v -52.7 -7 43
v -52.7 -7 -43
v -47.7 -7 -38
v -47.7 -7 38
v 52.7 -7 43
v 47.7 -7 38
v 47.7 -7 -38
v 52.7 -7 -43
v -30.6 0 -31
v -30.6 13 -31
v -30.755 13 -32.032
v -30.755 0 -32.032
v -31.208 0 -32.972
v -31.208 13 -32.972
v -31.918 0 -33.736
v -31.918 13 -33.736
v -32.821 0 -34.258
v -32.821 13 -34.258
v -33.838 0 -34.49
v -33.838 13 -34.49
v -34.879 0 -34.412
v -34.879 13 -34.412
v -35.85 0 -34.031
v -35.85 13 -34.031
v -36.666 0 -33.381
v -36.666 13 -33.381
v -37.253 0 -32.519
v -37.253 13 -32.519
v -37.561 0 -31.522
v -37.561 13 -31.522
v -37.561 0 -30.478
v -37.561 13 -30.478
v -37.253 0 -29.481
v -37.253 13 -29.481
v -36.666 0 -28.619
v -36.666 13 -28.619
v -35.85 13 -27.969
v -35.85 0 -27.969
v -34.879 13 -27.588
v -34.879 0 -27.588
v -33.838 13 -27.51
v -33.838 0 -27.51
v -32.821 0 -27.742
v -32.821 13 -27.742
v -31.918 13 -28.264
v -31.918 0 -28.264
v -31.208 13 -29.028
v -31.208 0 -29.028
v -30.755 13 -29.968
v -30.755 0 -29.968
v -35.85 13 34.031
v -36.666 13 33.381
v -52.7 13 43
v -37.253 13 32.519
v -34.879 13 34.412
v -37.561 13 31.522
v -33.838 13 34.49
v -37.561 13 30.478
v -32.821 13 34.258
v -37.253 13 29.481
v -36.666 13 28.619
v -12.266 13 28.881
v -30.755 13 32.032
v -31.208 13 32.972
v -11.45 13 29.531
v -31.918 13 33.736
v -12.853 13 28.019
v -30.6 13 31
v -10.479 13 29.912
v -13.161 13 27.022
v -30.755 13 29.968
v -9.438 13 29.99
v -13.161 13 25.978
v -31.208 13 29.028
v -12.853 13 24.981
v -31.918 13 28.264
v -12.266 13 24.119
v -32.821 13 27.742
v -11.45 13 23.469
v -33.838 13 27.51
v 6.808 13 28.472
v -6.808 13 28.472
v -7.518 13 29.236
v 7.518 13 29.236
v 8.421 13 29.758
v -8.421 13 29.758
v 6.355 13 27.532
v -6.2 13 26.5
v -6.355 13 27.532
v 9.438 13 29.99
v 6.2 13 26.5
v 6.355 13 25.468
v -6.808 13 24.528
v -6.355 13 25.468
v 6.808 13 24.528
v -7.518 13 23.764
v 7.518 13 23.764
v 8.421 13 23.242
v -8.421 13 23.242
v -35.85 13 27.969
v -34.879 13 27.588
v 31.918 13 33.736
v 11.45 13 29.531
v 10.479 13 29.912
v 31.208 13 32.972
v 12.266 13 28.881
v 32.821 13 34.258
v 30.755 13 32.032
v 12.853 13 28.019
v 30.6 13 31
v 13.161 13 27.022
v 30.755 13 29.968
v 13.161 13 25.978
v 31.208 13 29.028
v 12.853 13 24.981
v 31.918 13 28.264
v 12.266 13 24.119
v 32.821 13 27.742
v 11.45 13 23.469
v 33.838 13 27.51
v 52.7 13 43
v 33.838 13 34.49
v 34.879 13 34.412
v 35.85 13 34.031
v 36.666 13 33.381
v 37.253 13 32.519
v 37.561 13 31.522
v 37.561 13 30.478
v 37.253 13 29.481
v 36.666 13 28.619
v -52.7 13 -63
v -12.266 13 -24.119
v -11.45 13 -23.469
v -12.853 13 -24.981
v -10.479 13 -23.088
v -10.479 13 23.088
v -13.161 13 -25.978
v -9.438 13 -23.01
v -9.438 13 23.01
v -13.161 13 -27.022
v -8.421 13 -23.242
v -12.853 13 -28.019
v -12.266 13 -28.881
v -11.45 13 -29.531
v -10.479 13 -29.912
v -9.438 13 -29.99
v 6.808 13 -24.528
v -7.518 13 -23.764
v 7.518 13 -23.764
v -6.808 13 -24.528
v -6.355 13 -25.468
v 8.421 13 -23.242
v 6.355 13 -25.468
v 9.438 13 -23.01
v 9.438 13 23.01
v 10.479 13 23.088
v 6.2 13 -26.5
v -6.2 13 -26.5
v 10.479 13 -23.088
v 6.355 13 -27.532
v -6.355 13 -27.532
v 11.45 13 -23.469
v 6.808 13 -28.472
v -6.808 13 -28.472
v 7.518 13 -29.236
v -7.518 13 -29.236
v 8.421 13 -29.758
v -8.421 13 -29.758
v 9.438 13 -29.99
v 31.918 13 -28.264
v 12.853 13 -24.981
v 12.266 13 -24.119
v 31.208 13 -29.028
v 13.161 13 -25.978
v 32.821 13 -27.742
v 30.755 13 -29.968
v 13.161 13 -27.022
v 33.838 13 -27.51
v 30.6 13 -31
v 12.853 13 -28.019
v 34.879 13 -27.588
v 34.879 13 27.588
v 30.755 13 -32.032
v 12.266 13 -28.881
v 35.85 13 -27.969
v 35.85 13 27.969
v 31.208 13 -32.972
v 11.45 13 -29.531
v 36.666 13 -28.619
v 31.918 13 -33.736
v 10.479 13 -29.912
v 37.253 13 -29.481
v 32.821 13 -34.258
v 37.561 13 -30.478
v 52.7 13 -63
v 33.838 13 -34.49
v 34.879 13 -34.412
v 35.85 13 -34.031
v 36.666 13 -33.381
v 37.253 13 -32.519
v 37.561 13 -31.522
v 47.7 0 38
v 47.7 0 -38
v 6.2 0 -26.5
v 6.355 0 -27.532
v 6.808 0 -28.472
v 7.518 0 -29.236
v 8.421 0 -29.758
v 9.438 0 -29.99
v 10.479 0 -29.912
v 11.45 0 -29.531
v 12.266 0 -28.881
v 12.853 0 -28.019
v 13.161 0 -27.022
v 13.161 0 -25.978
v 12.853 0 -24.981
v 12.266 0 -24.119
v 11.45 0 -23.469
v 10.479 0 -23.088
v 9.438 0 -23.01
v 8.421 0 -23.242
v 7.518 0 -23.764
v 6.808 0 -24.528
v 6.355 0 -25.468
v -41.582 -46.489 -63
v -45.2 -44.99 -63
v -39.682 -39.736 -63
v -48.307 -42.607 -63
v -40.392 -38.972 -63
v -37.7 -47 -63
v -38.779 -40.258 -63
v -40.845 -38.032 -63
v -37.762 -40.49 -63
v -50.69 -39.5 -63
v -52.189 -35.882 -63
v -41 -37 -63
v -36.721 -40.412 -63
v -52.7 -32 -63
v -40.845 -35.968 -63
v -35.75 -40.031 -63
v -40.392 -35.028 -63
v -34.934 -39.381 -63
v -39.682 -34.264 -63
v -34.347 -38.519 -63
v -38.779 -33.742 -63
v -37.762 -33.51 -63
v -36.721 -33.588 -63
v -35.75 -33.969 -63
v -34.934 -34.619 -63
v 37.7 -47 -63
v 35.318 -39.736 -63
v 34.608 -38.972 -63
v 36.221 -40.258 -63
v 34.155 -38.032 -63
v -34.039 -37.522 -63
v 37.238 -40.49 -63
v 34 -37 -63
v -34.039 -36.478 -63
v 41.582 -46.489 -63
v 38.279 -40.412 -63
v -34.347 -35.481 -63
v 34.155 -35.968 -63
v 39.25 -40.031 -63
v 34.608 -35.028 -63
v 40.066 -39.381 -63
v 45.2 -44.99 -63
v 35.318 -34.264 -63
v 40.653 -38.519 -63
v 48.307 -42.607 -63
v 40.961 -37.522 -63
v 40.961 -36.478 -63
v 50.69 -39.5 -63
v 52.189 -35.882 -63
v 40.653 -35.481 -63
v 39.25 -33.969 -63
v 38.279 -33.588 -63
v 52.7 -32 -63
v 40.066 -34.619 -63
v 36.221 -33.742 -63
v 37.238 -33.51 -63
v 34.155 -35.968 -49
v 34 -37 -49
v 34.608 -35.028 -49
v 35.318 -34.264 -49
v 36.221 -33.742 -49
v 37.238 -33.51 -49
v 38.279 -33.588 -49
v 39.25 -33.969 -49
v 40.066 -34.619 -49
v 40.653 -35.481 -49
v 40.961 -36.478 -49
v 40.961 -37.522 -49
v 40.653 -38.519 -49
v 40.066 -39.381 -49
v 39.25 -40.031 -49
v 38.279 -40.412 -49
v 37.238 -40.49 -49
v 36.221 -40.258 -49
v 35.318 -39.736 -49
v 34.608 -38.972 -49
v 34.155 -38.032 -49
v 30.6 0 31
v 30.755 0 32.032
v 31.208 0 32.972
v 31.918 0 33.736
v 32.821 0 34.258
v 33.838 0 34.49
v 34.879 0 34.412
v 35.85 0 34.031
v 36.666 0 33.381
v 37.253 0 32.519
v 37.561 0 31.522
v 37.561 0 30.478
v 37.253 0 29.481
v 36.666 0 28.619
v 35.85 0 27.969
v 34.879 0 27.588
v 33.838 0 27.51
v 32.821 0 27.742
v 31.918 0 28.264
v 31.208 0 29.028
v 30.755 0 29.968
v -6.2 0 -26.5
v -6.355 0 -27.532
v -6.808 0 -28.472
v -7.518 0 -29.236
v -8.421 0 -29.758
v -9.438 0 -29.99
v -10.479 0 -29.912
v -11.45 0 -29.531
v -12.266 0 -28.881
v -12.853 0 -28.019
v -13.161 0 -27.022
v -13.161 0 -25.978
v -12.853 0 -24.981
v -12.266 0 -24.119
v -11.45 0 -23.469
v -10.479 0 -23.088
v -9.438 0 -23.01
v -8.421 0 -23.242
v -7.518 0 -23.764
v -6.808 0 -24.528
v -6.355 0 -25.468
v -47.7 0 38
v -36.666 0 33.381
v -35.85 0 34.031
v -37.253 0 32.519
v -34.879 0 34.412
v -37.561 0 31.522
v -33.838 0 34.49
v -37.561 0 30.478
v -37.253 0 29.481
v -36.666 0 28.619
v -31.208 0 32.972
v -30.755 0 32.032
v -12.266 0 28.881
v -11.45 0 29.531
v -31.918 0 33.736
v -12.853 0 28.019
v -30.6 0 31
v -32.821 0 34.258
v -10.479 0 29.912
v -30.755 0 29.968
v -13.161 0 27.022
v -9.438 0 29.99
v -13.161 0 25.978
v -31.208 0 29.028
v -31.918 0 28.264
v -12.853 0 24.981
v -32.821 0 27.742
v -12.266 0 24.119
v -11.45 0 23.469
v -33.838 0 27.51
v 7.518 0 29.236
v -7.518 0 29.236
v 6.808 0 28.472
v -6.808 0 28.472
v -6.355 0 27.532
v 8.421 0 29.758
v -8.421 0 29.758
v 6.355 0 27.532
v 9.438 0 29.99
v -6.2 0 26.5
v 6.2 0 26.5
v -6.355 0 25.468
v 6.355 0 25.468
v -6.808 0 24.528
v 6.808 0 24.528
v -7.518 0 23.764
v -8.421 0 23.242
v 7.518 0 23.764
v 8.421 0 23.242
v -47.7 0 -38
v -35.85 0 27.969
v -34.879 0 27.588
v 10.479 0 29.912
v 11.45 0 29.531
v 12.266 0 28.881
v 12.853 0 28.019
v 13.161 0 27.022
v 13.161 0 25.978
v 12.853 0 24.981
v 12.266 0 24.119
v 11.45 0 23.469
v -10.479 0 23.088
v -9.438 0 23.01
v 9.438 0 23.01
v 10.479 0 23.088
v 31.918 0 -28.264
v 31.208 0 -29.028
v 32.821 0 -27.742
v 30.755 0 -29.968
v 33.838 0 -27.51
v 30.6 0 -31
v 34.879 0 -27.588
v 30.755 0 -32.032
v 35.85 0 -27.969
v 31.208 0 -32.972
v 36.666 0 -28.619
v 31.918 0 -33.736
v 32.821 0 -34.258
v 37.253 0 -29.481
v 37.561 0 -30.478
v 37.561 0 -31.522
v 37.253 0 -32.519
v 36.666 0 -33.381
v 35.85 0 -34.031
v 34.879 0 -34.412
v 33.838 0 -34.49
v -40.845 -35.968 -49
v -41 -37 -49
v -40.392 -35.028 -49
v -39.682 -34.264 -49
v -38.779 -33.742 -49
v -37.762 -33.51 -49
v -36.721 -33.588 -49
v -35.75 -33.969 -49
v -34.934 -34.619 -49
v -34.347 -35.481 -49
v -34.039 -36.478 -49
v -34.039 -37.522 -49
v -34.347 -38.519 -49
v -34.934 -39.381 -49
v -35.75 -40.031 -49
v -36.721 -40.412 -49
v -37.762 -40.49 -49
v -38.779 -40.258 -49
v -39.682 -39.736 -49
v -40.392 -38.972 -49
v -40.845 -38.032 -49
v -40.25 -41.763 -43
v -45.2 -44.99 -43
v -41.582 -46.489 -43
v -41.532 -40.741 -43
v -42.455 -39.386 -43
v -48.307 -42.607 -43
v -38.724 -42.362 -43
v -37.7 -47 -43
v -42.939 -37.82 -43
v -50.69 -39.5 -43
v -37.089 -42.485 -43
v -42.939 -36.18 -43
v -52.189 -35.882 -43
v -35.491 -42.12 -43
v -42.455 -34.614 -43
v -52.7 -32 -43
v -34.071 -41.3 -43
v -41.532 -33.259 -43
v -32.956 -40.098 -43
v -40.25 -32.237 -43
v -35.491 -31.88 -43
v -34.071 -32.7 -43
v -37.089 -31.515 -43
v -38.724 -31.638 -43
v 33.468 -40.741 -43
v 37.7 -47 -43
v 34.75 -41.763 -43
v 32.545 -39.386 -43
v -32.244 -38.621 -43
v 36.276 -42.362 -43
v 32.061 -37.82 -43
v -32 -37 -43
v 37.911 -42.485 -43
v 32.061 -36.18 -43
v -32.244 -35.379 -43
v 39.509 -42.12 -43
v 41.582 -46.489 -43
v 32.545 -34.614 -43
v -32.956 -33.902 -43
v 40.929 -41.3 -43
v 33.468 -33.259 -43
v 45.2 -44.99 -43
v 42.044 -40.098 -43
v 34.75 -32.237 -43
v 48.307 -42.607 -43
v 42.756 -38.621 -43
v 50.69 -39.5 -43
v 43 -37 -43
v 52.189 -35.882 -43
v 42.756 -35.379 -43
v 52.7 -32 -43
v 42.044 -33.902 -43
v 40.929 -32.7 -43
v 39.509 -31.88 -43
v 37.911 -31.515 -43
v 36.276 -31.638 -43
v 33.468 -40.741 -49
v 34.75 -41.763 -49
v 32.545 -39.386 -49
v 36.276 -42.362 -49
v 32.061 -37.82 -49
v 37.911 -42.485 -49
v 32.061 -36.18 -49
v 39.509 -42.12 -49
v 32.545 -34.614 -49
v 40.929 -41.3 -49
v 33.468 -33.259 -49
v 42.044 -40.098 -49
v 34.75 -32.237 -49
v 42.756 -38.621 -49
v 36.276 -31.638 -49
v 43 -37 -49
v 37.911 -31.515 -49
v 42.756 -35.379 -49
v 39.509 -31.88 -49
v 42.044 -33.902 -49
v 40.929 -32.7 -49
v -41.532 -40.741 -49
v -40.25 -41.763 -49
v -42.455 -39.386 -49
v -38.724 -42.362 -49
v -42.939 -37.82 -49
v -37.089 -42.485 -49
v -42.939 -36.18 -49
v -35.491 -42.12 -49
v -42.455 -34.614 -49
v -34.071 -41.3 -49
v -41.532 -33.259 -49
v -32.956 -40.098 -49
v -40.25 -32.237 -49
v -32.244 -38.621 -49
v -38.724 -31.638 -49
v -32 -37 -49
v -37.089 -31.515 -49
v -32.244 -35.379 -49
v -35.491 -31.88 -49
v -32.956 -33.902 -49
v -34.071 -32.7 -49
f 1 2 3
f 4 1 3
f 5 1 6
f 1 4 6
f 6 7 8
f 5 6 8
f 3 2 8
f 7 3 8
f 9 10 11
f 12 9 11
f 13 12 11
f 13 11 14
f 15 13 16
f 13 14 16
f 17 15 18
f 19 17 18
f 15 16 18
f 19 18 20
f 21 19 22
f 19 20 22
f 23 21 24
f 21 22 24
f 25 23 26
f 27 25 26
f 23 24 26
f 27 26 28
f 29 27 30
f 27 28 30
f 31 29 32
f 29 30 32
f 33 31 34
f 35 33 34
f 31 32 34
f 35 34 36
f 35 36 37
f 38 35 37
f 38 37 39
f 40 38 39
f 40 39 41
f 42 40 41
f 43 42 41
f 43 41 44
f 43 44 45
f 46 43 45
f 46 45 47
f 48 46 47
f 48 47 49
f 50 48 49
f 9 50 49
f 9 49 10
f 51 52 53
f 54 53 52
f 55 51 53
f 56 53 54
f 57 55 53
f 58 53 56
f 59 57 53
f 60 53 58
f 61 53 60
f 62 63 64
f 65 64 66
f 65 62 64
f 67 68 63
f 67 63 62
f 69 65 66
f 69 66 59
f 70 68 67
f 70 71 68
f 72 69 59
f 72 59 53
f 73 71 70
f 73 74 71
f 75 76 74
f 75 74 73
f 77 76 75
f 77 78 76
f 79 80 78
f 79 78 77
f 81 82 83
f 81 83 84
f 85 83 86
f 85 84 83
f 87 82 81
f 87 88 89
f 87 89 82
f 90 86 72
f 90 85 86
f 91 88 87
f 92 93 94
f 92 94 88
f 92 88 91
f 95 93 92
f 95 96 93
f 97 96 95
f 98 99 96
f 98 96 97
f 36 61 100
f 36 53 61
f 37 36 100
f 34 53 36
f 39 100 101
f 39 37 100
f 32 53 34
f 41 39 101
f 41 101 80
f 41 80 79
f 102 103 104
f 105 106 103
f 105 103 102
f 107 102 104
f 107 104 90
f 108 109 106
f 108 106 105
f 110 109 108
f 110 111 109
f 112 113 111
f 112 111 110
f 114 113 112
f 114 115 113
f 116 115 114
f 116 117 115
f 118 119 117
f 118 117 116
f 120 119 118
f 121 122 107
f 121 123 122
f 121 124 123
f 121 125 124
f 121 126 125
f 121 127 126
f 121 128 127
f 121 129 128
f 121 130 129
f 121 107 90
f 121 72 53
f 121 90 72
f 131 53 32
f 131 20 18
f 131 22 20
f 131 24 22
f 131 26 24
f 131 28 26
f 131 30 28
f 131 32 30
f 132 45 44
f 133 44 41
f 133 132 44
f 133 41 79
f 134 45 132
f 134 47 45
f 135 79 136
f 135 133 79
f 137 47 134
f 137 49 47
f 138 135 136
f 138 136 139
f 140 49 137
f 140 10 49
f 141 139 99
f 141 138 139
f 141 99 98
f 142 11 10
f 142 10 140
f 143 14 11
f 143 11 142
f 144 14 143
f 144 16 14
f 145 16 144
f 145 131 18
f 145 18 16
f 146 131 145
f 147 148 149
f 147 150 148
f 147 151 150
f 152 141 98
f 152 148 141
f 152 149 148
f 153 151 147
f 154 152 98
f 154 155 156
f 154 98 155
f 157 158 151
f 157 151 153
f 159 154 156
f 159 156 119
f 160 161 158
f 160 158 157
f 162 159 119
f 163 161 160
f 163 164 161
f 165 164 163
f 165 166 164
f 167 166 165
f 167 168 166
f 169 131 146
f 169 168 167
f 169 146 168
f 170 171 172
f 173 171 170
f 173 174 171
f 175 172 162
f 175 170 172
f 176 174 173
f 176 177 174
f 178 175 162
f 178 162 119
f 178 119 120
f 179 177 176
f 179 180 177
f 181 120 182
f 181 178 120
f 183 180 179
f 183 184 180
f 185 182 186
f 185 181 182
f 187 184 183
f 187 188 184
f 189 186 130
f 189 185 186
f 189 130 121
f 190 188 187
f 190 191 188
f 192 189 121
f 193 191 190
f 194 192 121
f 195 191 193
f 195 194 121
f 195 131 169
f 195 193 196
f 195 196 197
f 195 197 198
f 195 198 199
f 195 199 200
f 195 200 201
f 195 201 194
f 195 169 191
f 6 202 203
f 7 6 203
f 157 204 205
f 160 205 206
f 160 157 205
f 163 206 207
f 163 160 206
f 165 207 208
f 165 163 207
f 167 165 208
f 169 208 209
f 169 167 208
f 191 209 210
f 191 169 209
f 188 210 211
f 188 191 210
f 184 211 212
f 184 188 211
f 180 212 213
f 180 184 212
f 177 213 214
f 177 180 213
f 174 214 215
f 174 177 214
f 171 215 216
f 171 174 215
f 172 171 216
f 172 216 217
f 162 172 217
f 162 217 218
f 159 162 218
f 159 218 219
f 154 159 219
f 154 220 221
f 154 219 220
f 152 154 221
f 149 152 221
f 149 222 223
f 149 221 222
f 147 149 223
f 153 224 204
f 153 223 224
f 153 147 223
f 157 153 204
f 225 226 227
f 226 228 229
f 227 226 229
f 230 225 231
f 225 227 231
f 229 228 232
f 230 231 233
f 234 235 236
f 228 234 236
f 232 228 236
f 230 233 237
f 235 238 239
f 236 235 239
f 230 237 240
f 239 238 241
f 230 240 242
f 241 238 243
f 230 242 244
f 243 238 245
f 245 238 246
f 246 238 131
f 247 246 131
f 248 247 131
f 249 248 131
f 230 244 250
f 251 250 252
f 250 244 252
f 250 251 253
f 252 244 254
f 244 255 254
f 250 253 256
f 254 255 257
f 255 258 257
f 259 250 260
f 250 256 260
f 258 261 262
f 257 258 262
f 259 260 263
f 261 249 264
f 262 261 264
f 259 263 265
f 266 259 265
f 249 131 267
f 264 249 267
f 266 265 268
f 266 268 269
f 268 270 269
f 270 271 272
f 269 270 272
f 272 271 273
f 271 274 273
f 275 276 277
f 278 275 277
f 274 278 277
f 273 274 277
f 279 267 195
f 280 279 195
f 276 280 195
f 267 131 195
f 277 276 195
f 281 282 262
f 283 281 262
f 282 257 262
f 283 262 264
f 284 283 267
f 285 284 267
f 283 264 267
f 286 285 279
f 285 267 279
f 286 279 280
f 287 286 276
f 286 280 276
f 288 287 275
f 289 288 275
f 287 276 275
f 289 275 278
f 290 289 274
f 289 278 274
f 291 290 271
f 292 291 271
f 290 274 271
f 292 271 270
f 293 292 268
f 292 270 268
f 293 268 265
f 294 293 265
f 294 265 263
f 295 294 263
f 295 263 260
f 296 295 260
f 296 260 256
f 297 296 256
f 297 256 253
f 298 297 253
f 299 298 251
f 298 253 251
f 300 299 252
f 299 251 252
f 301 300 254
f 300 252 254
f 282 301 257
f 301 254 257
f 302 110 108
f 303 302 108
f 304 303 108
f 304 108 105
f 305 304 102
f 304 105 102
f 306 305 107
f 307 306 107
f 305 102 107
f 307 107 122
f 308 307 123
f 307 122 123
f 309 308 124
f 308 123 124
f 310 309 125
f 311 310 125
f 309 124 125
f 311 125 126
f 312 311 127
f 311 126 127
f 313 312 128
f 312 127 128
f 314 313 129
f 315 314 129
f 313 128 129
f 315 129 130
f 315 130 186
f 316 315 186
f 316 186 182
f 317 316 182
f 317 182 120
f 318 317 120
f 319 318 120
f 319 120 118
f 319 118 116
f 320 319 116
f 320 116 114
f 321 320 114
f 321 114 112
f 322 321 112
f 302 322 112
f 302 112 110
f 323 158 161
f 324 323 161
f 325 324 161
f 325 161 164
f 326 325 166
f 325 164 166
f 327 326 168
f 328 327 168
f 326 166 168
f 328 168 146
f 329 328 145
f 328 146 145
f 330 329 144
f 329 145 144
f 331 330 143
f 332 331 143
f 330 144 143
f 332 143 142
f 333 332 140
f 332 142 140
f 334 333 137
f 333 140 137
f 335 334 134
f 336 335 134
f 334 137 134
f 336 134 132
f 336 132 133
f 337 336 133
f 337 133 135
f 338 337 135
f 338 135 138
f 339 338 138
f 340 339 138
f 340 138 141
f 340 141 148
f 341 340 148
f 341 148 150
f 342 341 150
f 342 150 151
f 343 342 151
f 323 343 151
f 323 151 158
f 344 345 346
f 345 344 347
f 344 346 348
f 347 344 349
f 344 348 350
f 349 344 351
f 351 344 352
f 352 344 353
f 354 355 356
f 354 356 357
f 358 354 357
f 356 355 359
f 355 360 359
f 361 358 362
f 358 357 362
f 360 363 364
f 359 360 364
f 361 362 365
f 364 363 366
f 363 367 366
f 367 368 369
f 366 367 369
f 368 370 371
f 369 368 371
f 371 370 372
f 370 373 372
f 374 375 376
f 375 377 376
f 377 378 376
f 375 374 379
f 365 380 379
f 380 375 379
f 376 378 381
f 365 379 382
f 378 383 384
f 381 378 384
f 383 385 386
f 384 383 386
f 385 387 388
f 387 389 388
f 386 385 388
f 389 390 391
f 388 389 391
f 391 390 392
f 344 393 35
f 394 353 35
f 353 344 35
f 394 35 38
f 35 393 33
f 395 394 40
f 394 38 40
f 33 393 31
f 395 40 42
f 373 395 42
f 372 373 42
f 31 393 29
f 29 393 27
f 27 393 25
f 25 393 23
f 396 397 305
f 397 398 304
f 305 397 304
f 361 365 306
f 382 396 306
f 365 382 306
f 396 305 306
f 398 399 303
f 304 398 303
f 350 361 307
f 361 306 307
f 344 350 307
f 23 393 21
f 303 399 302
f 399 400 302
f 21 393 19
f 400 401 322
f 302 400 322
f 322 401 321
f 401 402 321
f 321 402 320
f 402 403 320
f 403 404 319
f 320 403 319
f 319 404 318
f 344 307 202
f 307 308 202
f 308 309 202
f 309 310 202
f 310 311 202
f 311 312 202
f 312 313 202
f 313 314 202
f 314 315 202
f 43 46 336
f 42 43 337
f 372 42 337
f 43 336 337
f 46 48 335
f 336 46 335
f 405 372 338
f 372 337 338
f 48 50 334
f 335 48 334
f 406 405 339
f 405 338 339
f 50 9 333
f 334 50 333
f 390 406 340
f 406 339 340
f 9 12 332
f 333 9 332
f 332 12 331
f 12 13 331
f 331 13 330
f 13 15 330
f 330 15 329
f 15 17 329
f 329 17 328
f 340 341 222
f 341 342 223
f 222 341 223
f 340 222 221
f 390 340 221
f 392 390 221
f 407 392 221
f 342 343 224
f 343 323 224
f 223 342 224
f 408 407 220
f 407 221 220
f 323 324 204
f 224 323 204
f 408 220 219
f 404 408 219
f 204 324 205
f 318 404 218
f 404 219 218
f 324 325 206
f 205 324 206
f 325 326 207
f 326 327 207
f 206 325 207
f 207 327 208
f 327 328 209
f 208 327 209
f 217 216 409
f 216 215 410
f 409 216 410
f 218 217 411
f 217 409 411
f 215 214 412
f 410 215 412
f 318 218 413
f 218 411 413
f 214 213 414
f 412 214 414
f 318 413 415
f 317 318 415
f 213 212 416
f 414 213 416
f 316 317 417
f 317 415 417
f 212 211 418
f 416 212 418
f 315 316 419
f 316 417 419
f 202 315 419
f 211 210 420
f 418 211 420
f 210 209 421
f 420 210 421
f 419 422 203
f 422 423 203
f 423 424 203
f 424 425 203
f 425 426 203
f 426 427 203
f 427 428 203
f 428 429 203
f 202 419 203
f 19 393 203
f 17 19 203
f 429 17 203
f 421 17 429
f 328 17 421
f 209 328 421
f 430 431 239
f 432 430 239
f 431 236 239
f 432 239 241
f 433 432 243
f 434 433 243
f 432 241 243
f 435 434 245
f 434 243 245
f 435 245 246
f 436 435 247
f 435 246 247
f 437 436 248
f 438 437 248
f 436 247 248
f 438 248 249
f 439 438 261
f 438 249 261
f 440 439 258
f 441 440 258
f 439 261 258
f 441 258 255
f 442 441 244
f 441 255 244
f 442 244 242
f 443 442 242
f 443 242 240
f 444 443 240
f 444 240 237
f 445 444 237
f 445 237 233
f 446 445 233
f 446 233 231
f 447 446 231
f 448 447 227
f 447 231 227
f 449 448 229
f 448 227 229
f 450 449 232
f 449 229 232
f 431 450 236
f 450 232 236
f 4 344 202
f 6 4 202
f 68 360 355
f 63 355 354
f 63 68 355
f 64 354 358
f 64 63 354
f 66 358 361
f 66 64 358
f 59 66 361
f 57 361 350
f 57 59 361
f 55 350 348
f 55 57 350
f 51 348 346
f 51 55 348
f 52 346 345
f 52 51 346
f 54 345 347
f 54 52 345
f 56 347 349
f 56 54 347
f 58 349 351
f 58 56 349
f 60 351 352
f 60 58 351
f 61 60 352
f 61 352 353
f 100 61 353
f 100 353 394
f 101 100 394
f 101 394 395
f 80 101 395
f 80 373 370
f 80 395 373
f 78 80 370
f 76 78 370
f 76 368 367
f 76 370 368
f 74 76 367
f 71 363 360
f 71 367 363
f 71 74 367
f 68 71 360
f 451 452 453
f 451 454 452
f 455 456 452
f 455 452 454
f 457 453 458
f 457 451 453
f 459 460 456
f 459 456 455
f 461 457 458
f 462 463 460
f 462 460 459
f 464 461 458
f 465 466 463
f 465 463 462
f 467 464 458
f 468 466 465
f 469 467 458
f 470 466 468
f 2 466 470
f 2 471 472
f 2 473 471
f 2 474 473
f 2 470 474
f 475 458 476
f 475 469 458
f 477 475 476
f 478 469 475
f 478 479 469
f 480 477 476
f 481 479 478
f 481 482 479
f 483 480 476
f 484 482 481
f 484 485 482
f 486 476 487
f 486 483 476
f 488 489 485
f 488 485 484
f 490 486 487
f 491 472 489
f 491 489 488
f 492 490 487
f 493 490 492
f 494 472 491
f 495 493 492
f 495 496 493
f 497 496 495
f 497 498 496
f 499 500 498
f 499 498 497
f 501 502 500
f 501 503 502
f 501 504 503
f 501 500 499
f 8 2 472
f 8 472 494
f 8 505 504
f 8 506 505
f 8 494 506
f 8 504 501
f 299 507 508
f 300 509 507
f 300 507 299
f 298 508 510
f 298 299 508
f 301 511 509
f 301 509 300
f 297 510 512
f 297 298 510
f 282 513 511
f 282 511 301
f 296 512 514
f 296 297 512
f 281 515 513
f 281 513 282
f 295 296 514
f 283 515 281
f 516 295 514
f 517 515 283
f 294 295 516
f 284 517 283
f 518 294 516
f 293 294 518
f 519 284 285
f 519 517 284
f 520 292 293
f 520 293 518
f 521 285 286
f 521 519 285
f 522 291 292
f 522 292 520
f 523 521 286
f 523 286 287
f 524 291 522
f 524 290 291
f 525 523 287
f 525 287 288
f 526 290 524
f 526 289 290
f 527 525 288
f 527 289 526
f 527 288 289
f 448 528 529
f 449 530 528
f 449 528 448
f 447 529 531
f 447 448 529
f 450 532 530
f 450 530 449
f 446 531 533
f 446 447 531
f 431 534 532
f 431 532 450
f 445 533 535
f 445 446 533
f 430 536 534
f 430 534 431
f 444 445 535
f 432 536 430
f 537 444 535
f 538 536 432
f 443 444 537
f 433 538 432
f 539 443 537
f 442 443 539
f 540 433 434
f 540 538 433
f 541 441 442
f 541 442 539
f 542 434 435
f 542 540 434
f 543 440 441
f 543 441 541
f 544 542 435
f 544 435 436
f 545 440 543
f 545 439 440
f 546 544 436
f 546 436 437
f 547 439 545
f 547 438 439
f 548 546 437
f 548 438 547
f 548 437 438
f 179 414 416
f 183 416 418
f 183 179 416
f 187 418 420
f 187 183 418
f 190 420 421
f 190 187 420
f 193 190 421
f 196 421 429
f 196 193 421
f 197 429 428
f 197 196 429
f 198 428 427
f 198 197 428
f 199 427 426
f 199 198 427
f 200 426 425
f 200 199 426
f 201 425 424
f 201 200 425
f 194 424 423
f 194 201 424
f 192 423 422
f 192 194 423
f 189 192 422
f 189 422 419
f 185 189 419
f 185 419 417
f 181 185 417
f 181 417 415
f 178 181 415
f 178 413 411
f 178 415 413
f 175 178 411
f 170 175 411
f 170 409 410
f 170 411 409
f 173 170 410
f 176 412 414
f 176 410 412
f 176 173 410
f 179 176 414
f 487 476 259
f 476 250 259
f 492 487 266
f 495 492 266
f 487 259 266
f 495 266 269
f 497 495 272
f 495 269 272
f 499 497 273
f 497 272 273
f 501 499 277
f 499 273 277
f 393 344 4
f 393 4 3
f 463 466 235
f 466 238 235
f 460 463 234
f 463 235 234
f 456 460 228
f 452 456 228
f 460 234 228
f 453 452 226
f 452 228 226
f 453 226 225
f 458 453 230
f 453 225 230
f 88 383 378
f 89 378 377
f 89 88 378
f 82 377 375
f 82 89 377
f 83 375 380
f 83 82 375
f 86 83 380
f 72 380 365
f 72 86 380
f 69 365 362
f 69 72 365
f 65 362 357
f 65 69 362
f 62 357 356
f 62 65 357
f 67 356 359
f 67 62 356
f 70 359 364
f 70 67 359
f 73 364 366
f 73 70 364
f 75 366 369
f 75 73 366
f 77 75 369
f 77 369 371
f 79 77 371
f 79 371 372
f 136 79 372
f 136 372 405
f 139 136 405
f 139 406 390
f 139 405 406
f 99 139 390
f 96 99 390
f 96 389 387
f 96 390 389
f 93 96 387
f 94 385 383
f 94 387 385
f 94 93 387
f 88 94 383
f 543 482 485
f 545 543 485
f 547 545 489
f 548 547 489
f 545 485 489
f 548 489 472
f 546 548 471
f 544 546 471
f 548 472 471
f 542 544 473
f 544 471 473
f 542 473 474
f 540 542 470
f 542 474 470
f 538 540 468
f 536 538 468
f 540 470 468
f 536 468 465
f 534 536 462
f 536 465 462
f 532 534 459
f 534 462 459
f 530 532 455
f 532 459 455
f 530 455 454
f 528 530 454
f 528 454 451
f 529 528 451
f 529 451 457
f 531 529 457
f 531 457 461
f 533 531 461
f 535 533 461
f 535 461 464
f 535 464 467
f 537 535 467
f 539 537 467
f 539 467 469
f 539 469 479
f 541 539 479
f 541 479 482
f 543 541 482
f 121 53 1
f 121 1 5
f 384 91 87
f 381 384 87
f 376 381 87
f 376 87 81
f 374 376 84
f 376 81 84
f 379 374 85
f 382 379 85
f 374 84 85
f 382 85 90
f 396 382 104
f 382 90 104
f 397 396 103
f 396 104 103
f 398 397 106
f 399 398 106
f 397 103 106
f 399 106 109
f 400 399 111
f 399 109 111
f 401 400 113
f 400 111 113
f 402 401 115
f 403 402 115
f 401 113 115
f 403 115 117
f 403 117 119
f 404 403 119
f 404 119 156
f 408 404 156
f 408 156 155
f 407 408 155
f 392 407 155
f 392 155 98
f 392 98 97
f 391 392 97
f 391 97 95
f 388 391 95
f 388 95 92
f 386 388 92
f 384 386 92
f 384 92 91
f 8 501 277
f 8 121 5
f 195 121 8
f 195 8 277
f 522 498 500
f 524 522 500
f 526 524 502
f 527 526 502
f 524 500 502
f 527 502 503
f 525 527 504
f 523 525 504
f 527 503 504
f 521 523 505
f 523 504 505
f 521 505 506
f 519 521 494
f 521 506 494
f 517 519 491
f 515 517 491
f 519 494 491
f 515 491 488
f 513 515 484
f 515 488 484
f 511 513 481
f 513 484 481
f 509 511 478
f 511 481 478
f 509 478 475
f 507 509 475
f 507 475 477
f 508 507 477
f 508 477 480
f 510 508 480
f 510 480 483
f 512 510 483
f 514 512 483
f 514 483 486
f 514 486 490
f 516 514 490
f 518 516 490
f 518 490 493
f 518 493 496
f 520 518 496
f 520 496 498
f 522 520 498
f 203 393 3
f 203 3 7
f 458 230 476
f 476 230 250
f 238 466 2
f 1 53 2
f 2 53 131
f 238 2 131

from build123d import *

# Parameters (mm, degrees)
SKETCH1_W                                  = 95.4
SKETCH1_H                                  = 76
BOSS_EXTRUDE1_DEPTH                        = 13
SKETCH2_R                                  = 3.5
CUT_EXTRUDE1_DEPTH                         = 14
MIRROR1_AT_THE_SECOND_PLANE_COPY_1_SKETC_R = 3.5
MIRROR1_AT_THE_SECOND_PLANE_COPY_1_DEPTH   = 14
SKETCH3_W                                  = 105.4
SKETCH3_H                                  = 86
SKETCH3_W_2                                = 95.4
SKETCH3_H_2                                = 76
BOSS_EXTRUDE2_DEPTH                        = 20
SKETCH3_4_W                                = 105.4
SKETCH3_4_H                                = 20
BOSS_EXTRUDE3_DEPTH                        = 60
CBORE_FOR_M6_SHCS1_D                       = 7
CBORE_FOR_M6_SHCS1_CBORE_D                 = 11
CBORE_FOR_M6_SHCS1_CBORE_DEPTH             = 6
FILLET1_R                                  = 15


with BuildPart() as part:
    # Sketch1 → Boss-Extrude1 (new body)
    with BuildSketch(Plane(origin=(0, 0, 0), x_dir=(1, 0, 0), z_dir=(0, 1, 0))):
        Rectangle(SKETCH1_W, SKETCH1_H)
    extrude(amount=BOSS_EXTRUDE1_DEPTH)

    # Sketch2 → Cut-Extrude1 (cut, through all)
    with BuildSketch(Plane(origin=(0, 13, 0), x_dir=(1, 0, 0), z_dir=(0, 1, 0))):
        with Locations((-34.1, 31)):
            Circle(SKETCH2_R)
        with Locations((-9.7, 26.5)):
            Circle(SKETCH2_R)
    cut_extrude1 = extrude(amount=-CUT_EXTRUDE1_DEPTH, mode=Mode.SUBTRACT)

    # Mirror1: Cut-Extrude1 across plane
    add(cut_extrude1.mirror(Plane(origin=(0, 0, 0), x_dir=(0, 0, 1), z_dir=(1, 0, 0))), mode=Mode.SUBTRACT)

    # Mirror1 at the second plane: Cut-Extrude1 across plane
    add(cut_extrude1.mirror(Plane.XY), mode=Mode.SUBTRACT)

    # Mirror1 at the second plane copy 1 sketc → Mirror1 at the second plane copy 1 (cut, through all)
    with BuildSketch(Plane(origin=(0, 13, 0), x_dir=(-1, 0, 0), z_dir=(0, 1, 0))):
        with Locations((-34.1, 31)):
            Circle(MIRROR1_AT_THE_SECOND_PLANE_COPY_1_SKETC_R)
        with Locations((-9.7, 26.5)):
            Circle(MIRROR1_AT_THE_SECOND_PLANE_COPY_1_SKETC_R)
    extrude(amount=-MIRROR1_AT_THE_SECOND_PLANE_COPY_1_DEPTH, mode=Mode.SUBTRACT)

    # Sketch3 → Boss-Extrude2 (add)
    with BuildSketch(Plane(origin=(0, 13, 0), x_dir=(1, 0, 0), z_dir=(0, 1, 0))):
        Rectangle(SKETCH3_W, SKETCH3_H)
        Rectangle(SKETCH3_W_2, SKETCH3_H_2, mode=Mode.SUBTRACT)
    extrude(amount=-BOSS_EXTRUDE2_DEPTH)

    # Sketch3<4> → Boss-Extrude3 (add)
    with BuildSketch(Plane(origin=(0, 13, 0), x_dir=(1, 0, 0), z_dir=(0, 1, 0))):
        with Locations((0, 53)):
            Rectangle(SKETCH3_4_W, SKETCH3_4_H)
    extrude(amount=-BOSS_EXTRUDE3_DEPTH)

    # CBORE for M6 SHCS1 (through all)
    with Locations(Plane(origin=(37.5, -37, -43), x_dir=(1, 0, 0), z_dir=(0, 0, 1))):
        with Locations((0, 0), (-75, 0)):
            CounterBoreHole(CBORE_FOR_M6_SHCS1_D / 2, CBORE_FOR_M6_SHCS1_CBORE_D / 2, CBORE_FOR_M6_SHCS1_CBORE_DEPTH)

    # Fillet1
    fillet1_edges = [part.edges().sort_by_distance(p)[0] for p in [
        (-52.7, -47, -53),
        (52.7, -47, -53),
    ]]
    fillet(fillet1_edges, radius=FILLET1_R)


solid = part.part
